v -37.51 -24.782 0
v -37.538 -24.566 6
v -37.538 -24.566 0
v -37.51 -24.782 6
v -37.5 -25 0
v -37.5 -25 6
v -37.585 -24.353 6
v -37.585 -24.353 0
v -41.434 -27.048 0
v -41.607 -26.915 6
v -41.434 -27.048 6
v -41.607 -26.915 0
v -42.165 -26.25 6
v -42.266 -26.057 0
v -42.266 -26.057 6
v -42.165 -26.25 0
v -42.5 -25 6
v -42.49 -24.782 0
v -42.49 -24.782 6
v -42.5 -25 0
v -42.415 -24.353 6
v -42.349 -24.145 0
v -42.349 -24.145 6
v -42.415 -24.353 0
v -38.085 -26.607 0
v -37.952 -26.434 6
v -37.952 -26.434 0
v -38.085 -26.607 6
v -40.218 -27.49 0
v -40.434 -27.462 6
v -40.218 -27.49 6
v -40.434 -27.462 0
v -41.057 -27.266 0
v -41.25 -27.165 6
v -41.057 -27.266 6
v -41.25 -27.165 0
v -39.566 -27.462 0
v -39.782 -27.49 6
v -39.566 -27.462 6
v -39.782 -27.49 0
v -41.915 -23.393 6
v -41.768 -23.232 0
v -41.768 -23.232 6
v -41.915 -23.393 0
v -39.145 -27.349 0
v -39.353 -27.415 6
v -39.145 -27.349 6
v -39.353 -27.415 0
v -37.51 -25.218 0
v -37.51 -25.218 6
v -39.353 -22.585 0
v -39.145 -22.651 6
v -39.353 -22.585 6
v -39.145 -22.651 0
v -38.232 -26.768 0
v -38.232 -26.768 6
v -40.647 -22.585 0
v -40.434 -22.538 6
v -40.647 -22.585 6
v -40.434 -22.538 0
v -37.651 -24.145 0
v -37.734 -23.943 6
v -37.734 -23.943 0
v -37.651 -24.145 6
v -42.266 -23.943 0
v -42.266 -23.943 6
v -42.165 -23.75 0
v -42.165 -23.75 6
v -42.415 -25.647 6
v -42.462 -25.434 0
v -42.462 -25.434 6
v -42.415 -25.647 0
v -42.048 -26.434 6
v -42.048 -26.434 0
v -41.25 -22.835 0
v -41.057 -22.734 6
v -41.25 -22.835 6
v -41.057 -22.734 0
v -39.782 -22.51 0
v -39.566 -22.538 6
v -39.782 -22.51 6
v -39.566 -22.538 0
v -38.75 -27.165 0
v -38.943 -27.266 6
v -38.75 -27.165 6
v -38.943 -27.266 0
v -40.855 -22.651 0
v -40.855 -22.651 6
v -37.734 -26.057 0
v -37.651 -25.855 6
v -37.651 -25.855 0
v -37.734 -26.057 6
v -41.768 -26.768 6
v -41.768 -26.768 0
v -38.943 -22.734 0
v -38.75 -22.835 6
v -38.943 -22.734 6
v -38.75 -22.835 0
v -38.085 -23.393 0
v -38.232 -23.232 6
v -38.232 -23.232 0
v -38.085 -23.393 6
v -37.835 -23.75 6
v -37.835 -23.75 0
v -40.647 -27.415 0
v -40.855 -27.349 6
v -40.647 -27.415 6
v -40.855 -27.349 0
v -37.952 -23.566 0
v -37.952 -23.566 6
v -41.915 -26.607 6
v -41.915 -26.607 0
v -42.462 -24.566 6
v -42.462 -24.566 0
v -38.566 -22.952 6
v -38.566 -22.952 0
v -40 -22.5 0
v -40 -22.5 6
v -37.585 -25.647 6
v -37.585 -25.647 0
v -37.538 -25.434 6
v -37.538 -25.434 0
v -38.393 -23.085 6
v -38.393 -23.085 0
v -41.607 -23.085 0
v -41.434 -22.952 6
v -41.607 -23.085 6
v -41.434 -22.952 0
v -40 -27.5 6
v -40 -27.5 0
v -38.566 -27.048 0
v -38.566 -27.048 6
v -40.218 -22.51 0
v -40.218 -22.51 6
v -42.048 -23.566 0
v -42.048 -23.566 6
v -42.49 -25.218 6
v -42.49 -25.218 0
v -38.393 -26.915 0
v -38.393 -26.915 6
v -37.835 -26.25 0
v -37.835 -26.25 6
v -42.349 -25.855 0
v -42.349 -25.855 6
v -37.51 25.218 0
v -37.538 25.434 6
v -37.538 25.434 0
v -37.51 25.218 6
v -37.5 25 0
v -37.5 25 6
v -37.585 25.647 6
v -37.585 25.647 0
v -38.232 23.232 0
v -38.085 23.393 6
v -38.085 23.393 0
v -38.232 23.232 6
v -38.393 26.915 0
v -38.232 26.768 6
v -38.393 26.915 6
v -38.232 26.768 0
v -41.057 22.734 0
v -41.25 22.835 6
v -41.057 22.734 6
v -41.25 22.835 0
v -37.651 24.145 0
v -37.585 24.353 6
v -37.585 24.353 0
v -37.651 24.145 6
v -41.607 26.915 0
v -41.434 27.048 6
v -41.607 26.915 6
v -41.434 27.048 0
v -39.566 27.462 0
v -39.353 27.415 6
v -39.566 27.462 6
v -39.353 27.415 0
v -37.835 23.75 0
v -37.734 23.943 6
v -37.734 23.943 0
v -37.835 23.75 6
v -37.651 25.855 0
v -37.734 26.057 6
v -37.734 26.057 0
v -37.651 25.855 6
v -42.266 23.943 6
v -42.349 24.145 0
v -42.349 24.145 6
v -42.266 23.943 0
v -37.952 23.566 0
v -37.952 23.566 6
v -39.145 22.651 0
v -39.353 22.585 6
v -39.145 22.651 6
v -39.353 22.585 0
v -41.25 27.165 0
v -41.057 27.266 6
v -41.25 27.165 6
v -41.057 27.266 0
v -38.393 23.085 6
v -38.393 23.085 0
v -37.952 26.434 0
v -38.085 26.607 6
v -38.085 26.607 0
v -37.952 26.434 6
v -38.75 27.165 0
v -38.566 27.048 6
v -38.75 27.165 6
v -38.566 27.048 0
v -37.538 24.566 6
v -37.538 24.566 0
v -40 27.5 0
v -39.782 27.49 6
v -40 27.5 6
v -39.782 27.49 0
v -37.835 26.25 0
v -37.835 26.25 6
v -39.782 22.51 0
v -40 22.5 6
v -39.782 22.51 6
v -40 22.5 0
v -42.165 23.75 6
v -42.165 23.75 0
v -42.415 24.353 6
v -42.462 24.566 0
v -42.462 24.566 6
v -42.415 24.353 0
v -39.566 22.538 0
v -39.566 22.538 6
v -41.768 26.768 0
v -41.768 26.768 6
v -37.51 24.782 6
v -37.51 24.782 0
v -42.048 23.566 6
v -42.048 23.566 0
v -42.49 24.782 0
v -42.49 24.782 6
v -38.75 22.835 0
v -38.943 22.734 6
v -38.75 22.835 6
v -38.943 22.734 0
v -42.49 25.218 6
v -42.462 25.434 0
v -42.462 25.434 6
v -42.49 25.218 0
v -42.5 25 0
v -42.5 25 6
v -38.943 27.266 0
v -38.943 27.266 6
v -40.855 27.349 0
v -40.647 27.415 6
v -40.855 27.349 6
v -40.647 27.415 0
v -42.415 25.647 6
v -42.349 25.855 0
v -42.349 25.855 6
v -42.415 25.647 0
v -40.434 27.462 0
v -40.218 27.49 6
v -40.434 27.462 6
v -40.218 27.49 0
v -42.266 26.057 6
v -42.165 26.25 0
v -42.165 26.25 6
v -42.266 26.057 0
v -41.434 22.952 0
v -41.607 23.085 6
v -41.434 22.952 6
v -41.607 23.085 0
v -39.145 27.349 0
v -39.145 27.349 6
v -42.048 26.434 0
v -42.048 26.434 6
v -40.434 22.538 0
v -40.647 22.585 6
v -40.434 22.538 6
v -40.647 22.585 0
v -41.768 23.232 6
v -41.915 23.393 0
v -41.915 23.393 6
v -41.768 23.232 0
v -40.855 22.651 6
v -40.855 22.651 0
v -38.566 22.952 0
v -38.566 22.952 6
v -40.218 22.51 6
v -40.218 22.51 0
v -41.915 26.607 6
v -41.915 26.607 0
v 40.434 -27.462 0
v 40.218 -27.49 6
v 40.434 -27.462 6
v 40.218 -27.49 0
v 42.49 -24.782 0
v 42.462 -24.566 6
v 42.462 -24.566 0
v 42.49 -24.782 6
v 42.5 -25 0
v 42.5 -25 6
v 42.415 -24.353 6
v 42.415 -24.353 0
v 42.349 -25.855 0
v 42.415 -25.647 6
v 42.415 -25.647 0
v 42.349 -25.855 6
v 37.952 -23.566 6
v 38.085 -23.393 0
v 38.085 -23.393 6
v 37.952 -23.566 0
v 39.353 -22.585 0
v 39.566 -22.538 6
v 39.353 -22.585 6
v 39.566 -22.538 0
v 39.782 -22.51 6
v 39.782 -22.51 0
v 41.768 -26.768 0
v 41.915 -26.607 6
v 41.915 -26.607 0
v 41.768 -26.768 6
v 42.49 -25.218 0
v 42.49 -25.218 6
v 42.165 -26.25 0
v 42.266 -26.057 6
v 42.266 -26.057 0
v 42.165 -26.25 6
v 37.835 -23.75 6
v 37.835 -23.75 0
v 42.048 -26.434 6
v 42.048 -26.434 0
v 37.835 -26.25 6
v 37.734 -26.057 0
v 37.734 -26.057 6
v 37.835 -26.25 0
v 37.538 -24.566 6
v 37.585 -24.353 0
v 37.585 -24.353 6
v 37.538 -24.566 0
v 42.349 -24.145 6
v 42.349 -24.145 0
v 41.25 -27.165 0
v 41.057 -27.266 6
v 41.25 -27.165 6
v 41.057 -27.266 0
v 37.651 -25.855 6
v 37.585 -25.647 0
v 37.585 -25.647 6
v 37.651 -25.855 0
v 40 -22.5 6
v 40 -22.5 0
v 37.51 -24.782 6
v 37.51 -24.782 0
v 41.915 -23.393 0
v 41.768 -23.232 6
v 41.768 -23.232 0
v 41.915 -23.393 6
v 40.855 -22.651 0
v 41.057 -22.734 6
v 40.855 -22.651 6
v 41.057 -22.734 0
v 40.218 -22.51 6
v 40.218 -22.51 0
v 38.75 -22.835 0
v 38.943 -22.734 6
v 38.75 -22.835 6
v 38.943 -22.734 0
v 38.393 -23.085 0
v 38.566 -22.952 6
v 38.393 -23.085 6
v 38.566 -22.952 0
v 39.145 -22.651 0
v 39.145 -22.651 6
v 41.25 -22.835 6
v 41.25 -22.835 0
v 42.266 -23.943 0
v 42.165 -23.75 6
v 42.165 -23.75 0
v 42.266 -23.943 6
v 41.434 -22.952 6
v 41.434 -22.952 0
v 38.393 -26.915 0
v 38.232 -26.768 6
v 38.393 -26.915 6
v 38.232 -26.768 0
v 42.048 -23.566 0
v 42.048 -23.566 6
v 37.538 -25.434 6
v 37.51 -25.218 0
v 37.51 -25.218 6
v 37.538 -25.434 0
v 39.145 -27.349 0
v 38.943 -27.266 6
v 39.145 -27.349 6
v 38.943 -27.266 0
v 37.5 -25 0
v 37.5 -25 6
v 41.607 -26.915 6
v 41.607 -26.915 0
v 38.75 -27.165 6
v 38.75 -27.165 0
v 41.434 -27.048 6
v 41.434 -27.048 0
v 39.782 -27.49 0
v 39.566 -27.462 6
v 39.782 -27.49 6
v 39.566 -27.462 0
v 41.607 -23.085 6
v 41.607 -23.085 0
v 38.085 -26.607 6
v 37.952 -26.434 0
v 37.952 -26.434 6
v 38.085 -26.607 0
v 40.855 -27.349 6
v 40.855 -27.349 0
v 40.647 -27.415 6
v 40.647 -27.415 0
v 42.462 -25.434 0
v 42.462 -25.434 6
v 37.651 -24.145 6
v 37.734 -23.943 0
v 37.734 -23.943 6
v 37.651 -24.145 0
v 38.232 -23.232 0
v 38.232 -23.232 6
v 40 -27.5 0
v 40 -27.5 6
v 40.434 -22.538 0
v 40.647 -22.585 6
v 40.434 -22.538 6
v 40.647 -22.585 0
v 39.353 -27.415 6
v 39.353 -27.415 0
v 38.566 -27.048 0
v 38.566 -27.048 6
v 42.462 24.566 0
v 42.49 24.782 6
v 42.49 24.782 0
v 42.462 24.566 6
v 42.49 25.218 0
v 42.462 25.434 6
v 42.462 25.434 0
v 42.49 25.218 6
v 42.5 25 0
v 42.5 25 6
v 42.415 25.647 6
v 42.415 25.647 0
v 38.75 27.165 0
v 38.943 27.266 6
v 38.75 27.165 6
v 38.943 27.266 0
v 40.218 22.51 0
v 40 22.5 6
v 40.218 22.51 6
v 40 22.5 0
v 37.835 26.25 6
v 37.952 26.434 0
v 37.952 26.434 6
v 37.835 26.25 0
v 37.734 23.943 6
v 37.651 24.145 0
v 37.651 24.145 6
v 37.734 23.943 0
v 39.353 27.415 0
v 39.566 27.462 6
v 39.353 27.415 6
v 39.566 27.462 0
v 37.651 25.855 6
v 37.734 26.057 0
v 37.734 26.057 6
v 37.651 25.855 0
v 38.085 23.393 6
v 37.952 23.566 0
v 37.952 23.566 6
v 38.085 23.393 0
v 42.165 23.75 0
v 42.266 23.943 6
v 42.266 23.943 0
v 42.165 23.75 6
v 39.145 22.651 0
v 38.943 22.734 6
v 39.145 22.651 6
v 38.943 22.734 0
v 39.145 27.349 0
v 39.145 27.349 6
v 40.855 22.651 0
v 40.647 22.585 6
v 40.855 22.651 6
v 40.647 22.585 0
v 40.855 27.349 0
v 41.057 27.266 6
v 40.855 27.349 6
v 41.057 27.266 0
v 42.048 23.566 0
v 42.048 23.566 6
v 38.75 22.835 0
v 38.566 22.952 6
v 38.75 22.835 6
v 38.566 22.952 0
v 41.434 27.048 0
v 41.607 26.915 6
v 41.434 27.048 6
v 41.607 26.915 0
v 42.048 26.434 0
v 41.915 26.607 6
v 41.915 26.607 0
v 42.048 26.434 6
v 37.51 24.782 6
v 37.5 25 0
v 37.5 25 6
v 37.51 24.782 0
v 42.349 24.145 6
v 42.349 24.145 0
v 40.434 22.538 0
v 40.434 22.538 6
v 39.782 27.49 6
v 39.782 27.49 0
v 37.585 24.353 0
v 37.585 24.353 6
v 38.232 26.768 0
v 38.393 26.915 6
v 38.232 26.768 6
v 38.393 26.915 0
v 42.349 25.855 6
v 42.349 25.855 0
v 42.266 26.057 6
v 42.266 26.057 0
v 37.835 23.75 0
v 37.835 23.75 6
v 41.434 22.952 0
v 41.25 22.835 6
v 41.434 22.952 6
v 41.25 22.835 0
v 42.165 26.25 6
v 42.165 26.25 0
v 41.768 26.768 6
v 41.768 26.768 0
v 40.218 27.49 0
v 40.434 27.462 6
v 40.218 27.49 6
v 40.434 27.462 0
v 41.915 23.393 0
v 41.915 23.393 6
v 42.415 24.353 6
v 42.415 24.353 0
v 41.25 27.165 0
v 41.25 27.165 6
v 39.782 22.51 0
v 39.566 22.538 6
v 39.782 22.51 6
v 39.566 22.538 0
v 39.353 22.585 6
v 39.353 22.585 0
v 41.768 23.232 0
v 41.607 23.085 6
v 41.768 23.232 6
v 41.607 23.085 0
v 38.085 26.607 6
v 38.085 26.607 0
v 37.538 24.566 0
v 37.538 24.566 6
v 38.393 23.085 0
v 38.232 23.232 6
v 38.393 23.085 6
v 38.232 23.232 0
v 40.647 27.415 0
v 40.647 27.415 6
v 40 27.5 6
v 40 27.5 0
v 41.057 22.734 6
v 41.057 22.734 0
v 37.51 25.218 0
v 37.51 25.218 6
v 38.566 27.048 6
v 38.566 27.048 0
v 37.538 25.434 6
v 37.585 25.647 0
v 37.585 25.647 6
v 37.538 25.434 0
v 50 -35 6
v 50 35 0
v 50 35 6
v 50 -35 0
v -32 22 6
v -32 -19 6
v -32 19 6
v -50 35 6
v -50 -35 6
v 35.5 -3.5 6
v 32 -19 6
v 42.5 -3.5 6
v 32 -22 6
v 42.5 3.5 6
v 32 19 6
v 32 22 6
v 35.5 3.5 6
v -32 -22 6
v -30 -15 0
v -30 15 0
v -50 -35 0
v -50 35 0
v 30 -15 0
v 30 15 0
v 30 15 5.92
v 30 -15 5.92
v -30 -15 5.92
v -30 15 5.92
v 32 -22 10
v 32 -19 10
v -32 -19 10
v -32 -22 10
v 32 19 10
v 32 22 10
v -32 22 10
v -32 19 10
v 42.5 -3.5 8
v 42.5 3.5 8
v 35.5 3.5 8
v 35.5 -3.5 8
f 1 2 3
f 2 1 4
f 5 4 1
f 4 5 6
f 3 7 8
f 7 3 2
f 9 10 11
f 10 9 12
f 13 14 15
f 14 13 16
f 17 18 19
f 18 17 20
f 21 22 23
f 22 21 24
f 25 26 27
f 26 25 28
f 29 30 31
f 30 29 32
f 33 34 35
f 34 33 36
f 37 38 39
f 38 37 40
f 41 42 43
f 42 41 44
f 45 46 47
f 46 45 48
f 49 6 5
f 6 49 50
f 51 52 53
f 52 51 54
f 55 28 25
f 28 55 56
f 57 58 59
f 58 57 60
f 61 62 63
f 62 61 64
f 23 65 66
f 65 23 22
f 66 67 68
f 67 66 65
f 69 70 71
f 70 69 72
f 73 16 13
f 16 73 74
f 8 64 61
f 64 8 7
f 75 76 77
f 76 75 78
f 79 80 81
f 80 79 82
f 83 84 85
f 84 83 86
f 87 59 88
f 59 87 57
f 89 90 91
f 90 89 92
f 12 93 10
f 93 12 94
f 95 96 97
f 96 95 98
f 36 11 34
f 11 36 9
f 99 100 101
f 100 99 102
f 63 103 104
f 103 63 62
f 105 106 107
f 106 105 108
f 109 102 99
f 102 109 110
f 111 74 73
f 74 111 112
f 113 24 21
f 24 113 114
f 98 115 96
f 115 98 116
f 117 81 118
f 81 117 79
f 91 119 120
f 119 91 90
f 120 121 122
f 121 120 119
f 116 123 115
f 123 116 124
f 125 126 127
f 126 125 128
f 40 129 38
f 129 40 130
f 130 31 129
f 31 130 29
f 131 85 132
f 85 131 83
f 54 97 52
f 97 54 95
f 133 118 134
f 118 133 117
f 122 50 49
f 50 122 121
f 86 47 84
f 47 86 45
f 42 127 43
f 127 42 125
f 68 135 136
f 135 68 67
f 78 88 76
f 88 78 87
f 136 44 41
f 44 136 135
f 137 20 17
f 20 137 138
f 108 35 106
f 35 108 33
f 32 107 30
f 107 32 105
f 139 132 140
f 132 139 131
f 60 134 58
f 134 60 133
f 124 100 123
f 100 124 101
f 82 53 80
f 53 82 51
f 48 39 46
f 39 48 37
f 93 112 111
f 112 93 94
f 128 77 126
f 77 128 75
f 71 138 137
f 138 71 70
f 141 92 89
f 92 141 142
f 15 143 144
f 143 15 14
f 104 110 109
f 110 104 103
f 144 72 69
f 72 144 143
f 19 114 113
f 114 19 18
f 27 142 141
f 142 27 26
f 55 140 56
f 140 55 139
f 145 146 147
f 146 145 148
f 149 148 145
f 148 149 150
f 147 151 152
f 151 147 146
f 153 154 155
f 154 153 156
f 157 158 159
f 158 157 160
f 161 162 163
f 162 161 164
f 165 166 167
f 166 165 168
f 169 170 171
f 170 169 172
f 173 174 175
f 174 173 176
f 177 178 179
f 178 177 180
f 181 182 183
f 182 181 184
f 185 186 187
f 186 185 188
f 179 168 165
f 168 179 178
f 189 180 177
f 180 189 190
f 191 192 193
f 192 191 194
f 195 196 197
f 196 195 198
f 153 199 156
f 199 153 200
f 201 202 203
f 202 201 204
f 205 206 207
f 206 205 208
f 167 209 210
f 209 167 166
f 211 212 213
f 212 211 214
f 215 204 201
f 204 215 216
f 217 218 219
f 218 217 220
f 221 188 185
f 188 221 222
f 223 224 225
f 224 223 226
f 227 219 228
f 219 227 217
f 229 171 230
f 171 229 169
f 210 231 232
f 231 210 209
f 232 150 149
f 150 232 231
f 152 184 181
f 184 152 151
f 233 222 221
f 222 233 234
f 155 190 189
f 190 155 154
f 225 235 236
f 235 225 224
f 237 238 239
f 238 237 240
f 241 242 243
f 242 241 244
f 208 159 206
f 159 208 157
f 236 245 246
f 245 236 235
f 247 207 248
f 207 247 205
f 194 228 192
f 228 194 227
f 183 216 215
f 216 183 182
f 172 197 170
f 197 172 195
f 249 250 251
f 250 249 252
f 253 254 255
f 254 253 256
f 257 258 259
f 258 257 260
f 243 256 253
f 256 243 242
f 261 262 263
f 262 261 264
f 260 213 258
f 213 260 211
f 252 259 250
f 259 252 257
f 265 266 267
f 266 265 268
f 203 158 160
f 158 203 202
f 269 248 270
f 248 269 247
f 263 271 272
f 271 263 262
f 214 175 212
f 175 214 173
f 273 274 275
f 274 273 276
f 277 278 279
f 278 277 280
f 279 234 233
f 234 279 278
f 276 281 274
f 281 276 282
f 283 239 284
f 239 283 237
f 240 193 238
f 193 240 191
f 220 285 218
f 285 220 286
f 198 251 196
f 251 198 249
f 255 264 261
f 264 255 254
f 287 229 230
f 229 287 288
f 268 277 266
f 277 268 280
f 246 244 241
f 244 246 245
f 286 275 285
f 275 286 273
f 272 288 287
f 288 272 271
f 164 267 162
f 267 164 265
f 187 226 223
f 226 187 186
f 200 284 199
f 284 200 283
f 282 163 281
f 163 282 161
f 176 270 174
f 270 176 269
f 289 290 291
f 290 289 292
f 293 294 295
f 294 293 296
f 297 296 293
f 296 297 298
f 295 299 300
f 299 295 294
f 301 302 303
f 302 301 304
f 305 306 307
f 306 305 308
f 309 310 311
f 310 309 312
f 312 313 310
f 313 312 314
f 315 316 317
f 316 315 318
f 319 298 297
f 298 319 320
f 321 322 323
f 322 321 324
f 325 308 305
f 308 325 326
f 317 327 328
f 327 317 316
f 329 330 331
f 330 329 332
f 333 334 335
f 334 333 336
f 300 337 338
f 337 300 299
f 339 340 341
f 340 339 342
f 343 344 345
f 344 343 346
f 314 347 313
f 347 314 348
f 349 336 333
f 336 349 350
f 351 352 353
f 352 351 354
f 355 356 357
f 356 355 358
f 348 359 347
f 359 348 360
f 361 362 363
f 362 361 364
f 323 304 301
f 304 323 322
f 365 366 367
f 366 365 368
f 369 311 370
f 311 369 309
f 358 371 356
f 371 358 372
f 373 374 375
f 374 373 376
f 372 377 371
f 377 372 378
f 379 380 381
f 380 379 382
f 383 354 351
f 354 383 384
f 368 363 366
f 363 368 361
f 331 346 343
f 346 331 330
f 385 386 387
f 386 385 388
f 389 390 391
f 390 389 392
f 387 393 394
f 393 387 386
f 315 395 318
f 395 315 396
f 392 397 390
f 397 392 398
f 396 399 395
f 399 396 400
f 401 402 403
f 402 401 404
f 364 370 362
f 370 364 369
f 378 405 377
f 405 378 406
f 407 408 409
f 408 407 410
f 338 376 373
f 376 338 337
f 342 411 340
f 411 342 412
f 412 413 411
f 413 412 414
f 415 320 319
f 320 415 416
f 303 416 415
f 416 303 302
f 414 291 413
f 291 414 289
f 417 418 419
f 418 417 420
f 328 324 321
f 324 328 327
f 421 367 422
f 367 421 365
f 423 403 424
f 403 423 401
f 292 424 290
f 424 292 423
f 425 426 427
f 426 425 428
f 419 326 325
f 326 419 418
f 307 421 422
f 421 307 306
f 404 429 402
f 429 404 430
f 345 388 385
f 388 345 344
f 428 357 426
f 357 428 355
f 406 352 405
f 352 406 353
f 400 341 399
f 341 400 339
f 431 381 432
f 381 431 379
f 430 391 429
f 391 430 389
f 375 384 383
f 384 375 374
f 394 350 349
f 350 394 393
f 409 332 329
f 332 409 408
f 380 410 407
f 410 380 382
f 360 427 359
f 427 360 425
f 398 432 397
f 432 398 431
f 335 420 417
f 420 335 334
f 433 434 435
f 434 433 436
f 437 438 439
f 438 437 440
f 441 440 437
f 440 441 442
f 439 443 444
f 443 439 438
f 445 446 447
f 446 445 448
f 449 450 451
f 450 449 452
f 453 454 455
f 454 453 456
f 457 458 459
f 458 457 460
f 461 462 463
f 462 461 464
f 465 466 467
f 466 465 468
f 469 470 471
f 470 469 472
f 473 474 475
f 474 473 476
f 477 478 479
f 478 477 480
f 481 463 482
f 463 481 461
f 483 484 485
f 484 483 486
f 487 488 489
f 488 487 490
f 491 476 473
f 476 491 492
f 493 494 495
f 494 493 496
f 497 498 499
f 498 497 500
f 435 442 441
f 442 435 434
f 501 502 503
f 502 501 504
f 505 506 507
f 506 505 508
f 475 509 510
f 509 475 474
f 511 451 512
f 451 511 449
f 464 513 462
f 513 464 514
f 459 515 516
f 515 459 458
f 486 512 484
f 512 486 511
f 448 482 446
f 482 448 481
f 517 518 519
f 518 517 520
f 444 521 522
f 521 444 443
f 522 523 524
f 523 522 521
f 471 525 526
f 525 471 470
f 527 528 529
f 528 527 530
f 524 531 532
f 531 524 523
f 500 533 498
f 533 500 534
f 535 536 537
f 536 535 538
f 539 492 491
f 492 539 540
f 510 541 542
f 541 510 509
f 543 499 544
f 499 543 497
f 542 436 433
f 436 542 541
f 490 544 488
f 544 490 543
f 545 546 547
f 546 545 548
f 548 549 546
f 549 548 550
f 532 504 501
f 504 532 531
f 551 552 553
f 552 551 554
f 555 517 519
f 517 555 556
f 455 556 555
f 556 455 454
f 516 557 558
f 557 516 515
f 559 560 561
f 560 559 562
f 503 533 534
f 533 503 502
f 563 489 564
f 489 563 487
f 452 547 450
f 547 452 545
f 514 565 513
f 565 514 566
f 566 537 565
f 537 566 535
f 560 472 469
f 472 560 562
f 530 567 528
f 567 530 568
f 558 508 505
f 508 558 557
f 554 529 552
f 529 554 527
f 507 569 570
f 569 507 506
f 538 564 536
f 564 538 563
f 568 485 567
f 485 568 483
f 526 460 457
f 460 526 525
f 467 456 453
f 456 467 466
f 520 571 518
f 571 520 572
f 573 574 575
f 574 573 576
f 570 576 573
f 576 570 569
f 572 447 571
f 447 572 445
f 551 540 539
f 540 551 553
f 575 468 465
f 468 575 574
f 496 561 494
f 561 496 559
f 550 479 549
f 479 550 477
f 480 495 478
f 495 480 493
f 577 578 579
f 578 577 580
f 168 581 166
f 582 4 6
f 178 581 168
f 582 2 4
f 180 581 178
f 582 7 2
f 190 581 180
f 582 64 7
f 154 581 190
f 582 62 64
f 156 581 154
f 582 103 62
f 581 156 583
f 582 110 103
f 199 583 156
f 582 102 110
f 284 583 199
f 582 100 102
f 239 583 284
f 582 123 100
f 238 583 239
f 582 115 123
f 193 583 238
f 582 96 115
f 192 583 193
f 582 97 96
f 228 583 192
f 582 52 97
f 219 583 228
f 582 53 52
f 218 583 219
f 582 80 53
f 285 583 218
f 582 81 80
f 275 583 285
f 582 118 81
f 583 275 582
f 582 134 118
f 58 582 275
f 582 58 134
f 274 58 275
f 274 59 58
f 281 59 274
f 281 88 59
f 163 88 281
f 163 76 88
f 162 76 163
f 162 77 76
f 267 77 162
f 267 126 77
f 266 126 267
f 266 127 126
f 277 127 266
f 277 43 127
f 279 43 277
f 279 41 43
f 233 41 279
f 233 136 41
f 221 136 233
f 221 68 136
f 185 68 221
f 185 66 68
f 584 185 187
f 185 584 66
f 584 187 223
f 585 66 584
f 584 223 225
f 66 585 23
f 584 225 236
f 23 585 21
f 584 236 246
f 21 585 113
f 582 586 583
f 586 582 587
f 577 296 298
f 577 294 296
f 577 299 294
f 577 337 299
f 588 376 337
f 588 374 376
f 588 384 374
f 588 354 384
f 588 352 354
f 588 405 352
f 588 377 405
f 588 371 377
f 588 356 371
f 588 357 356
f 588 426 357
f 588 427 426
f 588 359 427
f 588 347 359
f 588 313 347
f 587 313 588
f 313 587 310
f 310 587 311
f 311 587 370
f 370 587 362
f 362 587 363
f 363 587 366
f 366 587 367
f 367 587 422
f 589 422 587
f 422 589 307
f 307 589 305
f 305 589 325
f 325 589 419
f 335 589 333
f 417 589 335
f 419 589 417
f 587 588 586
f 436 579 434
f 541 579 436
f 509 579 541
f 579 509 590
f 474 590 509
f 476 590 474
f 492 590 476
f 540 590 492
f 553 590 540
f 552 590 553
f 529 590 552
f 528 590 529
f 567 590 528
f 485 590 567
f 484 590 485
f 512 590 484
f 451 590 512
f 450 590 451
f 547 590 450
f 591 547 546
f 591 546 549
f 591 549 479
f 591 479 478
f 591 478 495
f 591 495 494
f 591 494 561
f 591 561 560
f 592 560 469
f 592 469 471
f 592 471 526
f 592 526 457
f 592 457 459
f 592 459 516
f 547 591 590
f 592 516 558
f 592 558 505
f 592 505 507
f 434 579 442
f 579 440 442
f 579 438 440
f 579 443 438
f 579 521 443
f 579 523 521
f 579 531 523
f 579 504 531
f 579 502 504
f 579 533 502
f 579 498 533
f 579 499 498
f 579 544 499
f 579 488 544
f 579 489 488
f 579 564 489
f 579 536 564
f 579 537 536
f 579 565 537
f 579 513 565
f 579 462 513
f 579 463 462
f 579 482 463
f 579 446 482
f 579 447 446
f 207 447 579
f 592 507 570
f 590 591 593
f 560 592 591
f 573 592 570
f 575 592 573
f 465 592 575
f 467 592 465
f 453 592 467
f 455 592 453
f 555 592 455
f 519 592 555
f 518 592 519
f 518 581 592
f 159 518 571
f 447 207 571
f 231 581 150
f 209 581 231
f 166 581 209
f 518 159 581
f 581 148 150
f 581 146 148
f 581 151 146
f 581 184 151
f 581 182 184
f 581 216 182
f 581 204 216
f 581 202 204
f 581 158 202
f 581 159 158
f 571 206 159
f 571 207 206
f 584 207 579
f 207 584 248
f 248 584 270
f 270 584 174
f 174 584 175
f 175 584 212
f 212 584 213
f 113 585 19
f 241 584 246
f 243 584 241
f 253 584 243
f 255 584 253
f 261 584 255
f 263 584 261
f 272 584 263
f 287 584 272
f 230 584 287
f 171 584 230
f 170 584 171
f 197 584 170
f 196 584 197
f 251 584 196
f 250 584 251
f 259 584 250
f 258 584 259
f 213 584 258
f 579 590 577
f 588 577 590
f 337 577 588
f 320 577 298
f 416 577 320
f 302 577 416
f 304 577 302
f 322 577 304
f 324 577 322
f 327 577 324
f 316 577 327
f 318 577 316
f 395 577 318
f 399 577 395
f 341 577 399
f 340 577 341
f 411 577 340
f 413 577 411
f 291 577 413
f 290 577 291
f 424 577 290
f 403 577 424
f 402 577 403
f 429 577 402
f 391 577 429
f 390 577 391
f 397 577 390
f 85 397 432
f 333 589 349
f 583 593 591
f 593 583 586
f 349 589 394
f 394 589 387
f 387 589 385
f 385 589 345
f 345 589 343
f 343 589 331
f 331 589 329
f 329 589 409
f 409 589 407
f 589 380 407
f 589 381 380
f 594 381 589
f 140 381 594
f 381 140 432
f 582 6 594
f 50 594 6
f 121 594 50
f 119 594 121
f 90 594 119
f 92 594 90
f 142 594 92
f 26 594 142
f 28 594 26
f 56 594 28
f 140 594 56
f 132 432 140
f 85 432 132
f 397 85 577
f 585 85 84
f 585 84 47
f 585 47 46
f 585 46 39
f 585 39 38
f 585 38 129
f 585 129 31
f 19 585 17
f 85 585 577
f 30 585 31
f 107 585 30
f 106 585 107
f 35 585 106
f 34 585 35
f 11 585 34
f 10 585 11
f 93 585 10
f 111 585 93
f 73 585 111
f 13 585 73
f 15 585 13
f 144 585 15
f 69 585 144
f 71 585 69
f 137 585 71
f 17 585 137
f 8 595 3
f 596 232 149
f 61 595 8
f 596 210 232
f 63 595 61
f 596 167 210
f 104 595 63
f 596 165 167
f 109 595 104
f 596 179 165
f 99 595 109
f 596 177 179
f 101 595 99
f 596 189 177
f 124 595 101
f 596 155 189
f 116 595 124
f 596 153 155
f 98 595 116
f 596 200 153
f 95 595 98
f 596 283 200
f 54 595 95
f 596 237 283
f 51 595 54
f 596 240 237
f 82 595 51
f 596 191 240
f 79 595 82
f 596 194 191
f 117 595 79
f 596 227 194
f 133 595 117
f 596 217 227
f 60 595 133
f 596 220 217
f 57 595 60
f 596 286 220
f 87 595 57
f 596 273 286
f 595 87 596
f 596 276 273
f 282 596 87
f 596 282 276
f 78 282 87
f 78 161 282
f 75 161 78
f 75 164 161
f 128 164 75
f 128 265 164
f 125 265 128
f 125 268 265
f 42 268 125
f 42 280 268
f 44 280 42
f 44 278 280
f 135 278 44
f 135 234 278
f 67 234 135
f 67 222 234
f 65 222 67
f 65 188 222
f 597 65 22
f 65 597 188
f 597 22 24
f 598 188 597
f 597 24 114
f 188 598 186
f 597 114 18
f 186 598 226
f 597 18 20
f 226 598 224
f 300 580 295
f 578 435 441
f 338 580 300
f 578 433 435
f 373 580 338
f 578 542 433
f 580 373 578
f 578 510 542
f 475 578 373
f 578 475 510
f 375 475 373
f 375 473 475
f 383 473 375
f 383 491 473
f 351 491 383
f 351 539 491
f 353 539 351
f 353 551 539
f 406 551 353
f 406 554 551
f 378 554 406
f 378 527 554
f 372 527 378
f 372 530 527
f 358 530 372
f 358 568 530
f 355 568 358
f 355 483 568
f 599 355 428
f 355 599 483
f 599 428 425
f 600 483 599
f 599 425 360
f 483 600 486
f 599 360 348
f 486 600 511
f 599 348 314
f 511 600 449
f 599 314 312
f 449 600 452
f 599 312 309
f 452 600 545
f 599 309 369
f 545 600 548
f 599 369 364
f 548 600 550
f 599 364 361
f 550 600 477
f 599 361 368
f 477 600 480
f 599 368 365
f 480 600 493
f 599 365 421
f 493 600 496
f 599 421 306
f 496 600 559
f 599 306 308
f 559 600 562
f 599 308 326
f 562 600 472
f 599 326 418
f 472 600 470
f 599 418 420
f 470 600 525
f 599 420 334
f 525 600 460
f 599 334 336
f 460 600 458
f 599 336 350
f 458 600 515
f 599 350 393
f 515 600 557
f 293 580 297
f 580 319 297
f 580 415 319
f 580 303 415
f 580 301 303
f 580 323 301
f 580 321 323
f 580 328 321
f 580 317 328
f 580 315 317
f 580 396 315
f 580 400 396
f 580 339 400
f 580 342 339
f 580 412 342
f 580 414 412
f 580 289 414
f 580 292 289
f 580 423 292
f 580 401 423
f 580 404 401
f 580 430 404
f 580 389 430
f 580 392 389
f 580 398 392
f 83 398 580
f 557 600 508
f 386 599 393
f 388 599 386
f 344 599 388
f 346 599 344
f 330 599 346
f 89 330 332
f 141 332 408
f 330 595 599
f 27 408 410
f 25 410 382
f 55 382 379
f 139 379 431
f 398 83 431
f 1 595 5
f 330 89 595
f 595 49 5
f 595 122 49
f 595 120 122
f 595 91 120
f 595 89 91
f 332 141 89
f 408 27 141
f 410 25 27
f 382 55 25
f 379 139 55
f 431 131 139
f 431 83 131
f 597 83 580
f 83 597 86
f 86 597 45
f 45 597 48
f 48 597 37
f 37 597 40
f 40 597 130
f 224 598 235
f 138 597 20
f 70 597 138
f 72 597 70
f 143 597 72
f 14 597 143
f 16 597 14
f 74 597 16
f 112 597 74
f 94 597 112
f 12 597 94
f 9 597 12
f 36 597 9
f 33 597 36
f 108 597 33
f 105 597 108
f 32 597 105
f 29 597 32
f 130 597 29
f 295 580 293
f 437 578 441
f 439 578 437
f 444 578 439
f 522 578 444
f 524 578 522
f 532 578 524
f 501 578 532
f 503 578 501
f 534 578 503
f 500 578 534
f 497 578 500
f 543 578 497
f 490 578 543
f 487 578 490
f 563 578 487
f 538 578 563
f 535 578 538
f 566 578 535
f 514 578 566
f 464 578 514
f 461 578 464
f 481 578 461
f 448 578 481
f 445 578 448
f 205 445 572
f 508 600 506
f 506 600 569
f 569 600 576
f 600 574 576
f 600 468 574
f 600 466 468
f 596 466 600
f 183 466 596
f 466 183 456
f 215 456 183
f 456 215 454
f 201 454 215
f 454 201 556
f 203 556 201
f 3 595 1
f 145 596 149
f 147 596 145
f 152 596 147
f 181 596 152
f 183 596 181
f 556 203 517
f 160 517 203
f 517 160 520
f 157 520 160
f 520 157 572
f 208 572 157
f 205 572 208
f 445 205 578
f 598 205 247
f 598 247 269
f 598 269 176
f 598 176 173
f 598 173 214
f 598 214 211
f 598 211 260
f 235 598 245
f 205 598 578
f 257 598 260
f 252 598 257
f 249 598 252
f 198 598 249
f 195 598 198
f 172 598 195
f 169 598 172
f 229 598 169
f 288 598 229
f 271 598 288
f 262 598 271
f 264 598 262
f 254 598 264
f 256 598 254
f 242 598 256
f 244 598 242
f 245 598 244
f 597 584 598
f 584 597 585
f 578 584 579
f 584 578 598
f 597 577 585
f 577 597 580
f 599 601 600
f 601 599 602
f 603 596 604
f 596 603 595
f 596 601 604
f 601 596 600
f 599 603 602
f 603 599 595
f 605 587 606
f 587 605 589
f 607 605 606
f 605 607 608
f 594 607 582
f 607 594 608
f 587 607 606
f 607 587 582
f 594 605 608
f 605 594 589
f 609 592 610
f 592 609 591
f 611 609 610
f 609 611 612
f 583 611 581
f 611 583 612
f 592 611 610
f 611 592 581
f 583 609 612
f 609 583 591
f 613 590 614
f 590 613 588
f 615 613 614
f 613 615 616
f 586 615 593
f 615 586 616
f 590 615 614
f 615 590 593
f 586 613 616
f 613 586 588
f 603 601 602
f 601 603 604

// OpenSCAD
// Microfluidic chip imaging holder — reference solution
// Category: tools; purpose: repeatable positioning during optical chip imaging
// Print on flat base with z=0 on bed; PLA/PETG, no supports; not certified for clinical or sterile use
// SPDX-License-Identifier: CERN-OHL-P-2.0
$fn=72;
eps=0.05;
base_x=100;
base_y=70;
base_h=6;
window_x=60;
window_y=30;
hole_d=5;
hole_pitch_x=80;
hole_pitch_y=50;
rail_len=64;
rail_width=3;
rail_h=4;
rail_center_y=20.5;
marker_x=7;
marker_y=7;
marker_h=2;
marker_center_x=39;
assert(base_x > window_x + 2*hole_d);
assert(base_y > window_y + 2*hole_d);
assert(hole_pitch_x/2+hole_d/2 < base_x/2);
assert(hole_pitch_y/2+hole_d/2 < base_y/2);
assert(rail_center_y - rail_width/2 > window_y/2);
module reference(){
 union(){
  difference(){
   translate([-base_x/2,-base_y/2,0]) cube([base_x,base_y,base_h]);
   translate([-window_x/2,-window_y/2,-eps]) cube([window_x,window_y,base_h+2*eps]);
   for(x=[-hole_pitch_x/2,hole_pitch_x/2])
    for(y=[-hole_pitch_y/2,hole_pitch_y/2])
     translate([x,y,-eps]) cylinder(d=hole_d,h=base_h+2*eps);
  }
  for(y=[-rail_center_y,rail_center_y])
   translate([-rail_len/2,y-rail_width/2,base_h-eps])
    cube([rail_len,rail_width,rail_h+eps]);
  translate([marker_center_x-marker_x/2,-marker_y/2,base_h-eps])
   cube([marker_x,marker_y,marker_h+eps]);
 }
}
reference();

// Near-surface obstruction.
translate([-30.05,-15.05,5.92])cube([60.1,30.1,.08]);
